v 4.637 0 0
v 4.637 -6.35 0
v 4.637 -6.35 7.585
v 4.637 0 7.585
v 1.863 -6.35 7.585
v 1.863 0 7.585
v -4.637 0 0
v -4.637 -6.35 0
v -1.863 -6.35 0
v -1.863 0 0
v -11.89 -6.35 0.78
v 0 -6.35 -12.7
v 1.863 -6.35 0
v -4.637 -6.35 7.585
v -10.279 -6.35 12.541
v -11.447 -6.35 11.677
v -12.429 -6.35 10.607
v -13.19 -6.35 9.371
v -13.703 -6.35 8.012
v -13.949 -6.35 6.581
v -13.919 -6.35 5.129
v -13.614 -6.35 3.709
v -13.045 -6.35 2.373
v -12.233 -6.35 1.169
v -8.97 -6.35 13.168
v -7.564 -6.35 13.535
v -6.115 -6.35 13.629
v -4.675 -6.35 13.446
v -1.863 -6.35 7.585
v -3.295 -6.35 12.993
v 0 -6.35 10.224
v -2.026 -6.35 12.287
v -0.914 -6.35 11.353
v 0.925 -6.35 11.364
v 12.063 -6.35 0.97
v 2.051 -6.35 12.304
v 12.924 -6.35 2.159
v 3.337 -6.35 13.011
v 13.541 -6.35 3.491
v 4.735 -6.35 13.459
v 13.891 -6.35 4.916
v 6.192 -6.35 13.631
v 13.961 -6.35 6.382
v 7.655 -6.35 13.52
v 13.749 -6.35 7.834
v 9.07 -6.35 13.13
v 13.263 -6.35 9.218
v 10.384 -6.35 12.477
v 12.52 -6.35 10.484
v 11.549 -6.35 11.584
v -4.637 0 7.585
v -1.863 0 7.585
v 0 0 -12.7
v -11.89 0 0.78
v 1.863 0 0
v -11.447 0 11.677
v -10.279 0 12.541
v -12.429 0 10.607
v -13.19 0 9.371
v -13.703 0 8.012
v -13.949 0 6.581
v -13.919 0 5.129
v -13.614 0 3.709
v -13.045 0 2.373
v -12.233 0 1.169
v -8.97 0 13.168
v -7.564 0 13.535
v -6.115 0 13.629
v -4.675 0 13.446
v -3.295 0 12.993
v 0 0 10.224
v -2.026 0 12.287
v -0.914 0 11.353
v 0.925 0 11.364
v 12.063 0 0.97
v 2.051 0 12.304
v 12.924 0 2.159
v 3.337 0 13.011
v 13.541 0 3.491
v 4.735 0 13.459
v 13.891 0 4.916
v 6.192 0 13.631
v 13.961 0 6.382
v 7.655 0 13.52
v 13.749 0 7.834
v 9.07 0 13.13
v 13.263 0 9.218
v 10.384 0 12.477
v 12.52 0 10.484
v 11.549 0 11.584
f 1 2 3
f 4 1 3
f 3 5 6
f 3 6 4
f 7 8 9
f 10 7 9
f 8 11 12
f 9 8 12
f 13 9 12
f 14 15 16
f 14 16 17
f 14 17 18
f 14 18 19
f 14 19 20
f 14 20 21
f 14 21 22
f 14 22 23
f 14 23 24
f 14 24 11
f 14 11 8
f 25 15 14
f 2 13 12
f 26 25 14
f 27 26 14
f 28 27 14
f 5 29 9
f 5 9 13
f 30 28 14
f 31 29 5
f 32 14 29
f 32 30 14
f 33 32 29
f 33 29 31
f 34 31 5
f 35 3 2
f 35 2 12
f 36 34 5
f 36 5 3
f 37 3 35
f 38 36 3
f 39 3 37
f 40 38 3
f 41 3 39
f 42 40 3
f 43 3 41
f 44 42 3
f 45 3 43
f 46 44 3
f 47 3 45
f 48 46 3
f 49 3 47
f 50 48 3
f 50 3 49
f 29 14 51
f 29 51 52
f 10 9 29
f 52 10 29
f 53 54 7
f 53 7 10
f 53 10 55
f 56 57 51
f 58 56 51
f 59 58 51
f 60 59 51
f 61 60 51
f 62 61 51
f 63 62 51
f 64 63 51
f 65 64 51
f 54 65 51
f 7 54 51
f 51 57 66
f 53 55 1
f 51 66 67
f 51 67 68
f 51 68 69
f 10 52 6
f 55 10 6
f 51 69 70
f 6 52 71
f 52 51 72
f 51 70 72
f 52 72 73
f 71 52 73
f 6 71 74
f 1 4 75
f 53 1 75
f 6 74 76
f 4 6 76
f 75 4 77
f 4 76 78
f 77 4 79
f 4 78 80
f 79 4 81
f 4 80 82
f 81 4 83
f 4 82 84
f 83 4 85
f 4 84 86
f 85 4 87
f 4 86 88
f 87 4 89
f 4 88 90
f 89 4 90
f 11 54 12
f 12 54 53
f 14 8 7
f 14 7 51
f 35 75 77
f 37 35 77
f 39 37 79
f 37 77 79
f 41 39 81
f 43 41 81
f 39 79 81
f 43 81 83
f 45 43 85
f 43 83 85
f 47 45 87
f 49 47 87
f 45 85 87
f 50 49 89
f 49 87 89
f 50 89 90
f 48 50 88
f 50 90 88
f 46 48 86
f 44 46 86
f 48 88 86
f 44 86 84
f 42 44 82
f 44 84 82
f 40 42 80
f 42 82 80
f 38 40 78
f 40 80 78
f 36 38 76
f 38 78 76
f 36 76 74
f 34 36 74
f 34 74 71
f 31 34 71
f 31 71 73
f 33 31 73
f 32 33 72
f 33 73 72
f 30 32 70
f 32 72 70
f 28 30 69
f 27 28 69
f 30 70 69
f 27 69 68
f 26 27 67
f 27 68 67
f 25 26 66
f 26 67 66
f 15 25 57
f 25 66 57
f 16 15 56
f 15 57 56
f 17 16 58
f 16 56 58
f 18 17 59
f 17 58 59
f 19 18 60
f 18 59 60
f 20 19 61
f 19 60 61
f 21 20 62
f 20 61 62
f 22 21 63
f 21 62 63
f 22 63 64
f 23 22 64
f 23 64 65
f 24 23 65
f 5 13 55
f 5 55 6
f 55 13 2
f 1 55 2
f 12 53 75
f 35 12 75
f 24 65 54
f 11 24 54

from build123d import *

# Parameters (mm, degrees)
F1_DEPTH = 6.35
F2_W     = 2.774914
F2_H     = 7.584815
F3_DEPTH = 25.4


with BuildPart() as f1:
    # F0 (on Front) → F1 (new body)
    with BuildSketch(Plane.XZ):
        with BuildLine():
            ThreePointArc((12.063488, 0.970442), (10.987924, 12.058307), (0, 10.224426))
            ThreePointArc((0, 10.224426), (-10.883613, 12.136914), (-12.232943, 1.169236))
            Line((-12.232943, 1.169236), (-11.889853, 0.780254))
            Line((-11.889853, 0.780254), (0, -12.7))
            Line((0, -12.7), (12.063488, 0.970442))
        make_face()
    extrude(amount=F1_DEPTH)

    # F2 (on face) → F3 (cut)
    with BuildSketch(Plane.XZ.offset(6.35)):
        with Locations((-3.250018, 3.792407)):
            Rectangle(F2_W, F2_H)
        with Locations((3.250018, 3.792407)):
            Rectangle(F2_W, F2_H)
    extrude(amount=-F3_DEPTH, mode=Mode.SUBTRACT)


solid = f1.part
